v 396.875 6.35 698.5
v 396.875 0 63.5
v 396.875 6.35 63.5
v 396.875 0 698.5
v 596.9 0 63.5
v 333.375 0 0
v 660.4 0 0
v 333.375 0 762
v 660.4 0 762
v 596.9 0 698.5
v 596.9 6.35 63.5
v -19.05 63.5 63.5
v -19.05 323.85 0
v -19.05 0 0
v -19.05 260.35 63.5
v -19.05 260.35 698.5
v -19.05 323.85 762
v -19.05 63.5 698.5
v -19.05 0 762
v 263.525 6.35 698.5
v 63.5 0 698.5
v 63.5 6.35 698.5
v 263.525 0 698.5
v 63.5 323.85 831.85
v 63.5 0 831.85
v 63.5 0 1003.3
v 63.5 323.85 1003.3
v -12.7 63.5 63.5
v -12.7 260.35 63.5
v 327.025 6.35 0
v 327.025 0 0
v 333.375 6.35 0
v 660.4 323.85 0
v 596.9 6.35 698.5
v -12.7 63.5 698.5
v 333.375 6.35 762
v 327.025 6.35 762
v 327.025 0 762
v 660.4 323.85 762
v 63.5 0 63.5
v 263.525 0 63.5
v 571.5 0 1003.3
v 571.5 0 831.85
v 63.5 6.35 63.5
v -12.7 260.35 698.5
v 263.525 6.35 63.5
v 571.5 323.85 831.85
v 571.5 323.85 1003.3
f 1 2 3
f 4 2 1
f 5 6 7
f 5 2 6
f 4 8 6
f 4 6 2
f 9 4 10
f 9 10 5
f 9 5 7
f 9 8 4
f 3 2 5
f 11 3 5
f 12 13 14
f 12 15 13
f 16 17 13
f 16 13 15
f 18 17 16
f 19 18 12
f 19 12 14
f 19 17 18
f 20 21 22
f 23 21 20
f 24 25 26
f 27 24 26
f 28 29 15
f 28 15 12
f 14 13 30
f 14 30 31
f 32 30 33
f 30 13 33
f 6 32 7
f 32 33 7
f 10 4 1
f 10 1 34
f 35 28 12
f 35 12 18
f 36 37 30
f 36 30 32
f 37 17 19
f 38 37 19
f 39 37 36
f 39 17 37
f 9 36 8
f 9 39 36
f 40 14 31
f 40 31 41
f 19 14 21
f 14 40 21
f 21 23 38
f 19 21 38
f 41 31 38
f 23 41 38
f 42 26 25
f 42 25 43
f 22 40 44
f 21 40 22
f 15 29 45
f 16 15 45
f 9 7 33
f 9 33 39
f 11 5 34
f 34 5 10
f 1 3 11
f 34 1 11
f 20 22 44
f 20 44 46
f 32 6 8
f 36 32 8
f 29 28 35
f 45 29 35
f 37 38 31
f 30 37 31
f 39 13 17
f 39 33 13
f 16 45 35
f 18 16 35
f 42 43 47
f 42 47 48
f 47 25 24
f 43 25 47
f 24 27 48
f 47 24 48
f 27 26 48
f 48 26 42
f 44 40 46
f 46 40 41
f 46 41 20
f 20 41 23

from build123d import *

# Parameters (mm, degrees)
F0_W     = 508
F0_H     = 171.45
F1_DEPTH = 323.85
F0_W_2   = 327.025
F0_H_2   = 762
F0_W_3   = 200.025
F0_H_3   = 635
F2_DEPTH = 6.35
F3_W     = 323.85
F3_H     = 762
F3_W_2   = 196.85
F3_H_2   = 635
F4_DEPTH = 19.05
F5_DEPTH = 12.7


# Not quite as in the source:
# - a feature names something its author has since deleted; it is built from what else it names


with BuildPart() as f1:
    # F0 (on Front) → F1 (new body)
    with BuildSketch(Plane.XZ):
        with Locations((317.5, 917.575)):
            Rectangle(F0_W, F0_H)
    extrude(amount=-F1_DEPTH)


with BuildPart() as f1b:
    # F0 (on Front) → F1, piece 2 (new body)
    with BuildSketch(Plane.XZ):
        with Locations((163.5125, 381)):
            Rectangle(F0_W_2, F0_H_2)
        with Locations((163.5125, 381)):
            Rectangle(F0_W_3, F0_H_3, mode=Mode.SUBTRACT)
        with Locations((496.8875, 381)):
            Rectangle(F0_W_2, F0_H_2)
        with Locations((496.8875, 381)):
            Rectangle(F0_W_3, F0_H_3, mode=Mode.SUBTRACT)
        with Locations((163.5125, 381)):
            Rectangle(F0_W_3, F0_H_3)
        with Locations((496.8875, 381)):
            Rectangle(F0_W_3, F0_H_3)
        Polygon((327.025, 762), (327.025, 0), (333.375, 0), (333.375, 762), (330.2, 762), align=None)
    extrude(amount=-F1_DEPTH)

    # F0 (on Front) → F2 (cut)
    with BuildSketch(Plane.XZ):
        Polygon((327.025, 762), (327.025, 0), (333.375, 0), (333.375, 762), (330.2, 762), align=None)
        with Locations((317.5, 917.575)):
            Rectangle(F0_W, F0_H)
        with Locations((496.8875, 381)):
            Rectangle(F0_W_3, F0_H_3)
        with Locations((163.5125, 381)):
            Rectangle(F0_W_3, F0_H_3)
    extrude(amount=-F2_DEPTH, mode=Mode.SUBTRACT)

    # F3 (on face) → F4 (join)
    with BuildSketch(Plane(origin=(0, 0, 0), x_dir=(0, -1, 0), z_dir=(-1, 0, 0))):
        with Locations((-161.925, 381)):
            Rectangle(F3_W, F3_H)
        with Locations((-161.925, 381)):
            Rectangle(F3_W_2, F3_H_2, mode=Mode.SUBTRACT)
    extrude(amount=F4_DEPTH)

    # F5 (add): a face of the model
    f5_faces = [f1b.faces().sort_by_distance(p)[0] for p in [
        (0, 161.925, 381),
    ]]
    extrude(f5_faces, amount=F5_DEPTH)


solid = Compound([f1.part, f1b.part])
